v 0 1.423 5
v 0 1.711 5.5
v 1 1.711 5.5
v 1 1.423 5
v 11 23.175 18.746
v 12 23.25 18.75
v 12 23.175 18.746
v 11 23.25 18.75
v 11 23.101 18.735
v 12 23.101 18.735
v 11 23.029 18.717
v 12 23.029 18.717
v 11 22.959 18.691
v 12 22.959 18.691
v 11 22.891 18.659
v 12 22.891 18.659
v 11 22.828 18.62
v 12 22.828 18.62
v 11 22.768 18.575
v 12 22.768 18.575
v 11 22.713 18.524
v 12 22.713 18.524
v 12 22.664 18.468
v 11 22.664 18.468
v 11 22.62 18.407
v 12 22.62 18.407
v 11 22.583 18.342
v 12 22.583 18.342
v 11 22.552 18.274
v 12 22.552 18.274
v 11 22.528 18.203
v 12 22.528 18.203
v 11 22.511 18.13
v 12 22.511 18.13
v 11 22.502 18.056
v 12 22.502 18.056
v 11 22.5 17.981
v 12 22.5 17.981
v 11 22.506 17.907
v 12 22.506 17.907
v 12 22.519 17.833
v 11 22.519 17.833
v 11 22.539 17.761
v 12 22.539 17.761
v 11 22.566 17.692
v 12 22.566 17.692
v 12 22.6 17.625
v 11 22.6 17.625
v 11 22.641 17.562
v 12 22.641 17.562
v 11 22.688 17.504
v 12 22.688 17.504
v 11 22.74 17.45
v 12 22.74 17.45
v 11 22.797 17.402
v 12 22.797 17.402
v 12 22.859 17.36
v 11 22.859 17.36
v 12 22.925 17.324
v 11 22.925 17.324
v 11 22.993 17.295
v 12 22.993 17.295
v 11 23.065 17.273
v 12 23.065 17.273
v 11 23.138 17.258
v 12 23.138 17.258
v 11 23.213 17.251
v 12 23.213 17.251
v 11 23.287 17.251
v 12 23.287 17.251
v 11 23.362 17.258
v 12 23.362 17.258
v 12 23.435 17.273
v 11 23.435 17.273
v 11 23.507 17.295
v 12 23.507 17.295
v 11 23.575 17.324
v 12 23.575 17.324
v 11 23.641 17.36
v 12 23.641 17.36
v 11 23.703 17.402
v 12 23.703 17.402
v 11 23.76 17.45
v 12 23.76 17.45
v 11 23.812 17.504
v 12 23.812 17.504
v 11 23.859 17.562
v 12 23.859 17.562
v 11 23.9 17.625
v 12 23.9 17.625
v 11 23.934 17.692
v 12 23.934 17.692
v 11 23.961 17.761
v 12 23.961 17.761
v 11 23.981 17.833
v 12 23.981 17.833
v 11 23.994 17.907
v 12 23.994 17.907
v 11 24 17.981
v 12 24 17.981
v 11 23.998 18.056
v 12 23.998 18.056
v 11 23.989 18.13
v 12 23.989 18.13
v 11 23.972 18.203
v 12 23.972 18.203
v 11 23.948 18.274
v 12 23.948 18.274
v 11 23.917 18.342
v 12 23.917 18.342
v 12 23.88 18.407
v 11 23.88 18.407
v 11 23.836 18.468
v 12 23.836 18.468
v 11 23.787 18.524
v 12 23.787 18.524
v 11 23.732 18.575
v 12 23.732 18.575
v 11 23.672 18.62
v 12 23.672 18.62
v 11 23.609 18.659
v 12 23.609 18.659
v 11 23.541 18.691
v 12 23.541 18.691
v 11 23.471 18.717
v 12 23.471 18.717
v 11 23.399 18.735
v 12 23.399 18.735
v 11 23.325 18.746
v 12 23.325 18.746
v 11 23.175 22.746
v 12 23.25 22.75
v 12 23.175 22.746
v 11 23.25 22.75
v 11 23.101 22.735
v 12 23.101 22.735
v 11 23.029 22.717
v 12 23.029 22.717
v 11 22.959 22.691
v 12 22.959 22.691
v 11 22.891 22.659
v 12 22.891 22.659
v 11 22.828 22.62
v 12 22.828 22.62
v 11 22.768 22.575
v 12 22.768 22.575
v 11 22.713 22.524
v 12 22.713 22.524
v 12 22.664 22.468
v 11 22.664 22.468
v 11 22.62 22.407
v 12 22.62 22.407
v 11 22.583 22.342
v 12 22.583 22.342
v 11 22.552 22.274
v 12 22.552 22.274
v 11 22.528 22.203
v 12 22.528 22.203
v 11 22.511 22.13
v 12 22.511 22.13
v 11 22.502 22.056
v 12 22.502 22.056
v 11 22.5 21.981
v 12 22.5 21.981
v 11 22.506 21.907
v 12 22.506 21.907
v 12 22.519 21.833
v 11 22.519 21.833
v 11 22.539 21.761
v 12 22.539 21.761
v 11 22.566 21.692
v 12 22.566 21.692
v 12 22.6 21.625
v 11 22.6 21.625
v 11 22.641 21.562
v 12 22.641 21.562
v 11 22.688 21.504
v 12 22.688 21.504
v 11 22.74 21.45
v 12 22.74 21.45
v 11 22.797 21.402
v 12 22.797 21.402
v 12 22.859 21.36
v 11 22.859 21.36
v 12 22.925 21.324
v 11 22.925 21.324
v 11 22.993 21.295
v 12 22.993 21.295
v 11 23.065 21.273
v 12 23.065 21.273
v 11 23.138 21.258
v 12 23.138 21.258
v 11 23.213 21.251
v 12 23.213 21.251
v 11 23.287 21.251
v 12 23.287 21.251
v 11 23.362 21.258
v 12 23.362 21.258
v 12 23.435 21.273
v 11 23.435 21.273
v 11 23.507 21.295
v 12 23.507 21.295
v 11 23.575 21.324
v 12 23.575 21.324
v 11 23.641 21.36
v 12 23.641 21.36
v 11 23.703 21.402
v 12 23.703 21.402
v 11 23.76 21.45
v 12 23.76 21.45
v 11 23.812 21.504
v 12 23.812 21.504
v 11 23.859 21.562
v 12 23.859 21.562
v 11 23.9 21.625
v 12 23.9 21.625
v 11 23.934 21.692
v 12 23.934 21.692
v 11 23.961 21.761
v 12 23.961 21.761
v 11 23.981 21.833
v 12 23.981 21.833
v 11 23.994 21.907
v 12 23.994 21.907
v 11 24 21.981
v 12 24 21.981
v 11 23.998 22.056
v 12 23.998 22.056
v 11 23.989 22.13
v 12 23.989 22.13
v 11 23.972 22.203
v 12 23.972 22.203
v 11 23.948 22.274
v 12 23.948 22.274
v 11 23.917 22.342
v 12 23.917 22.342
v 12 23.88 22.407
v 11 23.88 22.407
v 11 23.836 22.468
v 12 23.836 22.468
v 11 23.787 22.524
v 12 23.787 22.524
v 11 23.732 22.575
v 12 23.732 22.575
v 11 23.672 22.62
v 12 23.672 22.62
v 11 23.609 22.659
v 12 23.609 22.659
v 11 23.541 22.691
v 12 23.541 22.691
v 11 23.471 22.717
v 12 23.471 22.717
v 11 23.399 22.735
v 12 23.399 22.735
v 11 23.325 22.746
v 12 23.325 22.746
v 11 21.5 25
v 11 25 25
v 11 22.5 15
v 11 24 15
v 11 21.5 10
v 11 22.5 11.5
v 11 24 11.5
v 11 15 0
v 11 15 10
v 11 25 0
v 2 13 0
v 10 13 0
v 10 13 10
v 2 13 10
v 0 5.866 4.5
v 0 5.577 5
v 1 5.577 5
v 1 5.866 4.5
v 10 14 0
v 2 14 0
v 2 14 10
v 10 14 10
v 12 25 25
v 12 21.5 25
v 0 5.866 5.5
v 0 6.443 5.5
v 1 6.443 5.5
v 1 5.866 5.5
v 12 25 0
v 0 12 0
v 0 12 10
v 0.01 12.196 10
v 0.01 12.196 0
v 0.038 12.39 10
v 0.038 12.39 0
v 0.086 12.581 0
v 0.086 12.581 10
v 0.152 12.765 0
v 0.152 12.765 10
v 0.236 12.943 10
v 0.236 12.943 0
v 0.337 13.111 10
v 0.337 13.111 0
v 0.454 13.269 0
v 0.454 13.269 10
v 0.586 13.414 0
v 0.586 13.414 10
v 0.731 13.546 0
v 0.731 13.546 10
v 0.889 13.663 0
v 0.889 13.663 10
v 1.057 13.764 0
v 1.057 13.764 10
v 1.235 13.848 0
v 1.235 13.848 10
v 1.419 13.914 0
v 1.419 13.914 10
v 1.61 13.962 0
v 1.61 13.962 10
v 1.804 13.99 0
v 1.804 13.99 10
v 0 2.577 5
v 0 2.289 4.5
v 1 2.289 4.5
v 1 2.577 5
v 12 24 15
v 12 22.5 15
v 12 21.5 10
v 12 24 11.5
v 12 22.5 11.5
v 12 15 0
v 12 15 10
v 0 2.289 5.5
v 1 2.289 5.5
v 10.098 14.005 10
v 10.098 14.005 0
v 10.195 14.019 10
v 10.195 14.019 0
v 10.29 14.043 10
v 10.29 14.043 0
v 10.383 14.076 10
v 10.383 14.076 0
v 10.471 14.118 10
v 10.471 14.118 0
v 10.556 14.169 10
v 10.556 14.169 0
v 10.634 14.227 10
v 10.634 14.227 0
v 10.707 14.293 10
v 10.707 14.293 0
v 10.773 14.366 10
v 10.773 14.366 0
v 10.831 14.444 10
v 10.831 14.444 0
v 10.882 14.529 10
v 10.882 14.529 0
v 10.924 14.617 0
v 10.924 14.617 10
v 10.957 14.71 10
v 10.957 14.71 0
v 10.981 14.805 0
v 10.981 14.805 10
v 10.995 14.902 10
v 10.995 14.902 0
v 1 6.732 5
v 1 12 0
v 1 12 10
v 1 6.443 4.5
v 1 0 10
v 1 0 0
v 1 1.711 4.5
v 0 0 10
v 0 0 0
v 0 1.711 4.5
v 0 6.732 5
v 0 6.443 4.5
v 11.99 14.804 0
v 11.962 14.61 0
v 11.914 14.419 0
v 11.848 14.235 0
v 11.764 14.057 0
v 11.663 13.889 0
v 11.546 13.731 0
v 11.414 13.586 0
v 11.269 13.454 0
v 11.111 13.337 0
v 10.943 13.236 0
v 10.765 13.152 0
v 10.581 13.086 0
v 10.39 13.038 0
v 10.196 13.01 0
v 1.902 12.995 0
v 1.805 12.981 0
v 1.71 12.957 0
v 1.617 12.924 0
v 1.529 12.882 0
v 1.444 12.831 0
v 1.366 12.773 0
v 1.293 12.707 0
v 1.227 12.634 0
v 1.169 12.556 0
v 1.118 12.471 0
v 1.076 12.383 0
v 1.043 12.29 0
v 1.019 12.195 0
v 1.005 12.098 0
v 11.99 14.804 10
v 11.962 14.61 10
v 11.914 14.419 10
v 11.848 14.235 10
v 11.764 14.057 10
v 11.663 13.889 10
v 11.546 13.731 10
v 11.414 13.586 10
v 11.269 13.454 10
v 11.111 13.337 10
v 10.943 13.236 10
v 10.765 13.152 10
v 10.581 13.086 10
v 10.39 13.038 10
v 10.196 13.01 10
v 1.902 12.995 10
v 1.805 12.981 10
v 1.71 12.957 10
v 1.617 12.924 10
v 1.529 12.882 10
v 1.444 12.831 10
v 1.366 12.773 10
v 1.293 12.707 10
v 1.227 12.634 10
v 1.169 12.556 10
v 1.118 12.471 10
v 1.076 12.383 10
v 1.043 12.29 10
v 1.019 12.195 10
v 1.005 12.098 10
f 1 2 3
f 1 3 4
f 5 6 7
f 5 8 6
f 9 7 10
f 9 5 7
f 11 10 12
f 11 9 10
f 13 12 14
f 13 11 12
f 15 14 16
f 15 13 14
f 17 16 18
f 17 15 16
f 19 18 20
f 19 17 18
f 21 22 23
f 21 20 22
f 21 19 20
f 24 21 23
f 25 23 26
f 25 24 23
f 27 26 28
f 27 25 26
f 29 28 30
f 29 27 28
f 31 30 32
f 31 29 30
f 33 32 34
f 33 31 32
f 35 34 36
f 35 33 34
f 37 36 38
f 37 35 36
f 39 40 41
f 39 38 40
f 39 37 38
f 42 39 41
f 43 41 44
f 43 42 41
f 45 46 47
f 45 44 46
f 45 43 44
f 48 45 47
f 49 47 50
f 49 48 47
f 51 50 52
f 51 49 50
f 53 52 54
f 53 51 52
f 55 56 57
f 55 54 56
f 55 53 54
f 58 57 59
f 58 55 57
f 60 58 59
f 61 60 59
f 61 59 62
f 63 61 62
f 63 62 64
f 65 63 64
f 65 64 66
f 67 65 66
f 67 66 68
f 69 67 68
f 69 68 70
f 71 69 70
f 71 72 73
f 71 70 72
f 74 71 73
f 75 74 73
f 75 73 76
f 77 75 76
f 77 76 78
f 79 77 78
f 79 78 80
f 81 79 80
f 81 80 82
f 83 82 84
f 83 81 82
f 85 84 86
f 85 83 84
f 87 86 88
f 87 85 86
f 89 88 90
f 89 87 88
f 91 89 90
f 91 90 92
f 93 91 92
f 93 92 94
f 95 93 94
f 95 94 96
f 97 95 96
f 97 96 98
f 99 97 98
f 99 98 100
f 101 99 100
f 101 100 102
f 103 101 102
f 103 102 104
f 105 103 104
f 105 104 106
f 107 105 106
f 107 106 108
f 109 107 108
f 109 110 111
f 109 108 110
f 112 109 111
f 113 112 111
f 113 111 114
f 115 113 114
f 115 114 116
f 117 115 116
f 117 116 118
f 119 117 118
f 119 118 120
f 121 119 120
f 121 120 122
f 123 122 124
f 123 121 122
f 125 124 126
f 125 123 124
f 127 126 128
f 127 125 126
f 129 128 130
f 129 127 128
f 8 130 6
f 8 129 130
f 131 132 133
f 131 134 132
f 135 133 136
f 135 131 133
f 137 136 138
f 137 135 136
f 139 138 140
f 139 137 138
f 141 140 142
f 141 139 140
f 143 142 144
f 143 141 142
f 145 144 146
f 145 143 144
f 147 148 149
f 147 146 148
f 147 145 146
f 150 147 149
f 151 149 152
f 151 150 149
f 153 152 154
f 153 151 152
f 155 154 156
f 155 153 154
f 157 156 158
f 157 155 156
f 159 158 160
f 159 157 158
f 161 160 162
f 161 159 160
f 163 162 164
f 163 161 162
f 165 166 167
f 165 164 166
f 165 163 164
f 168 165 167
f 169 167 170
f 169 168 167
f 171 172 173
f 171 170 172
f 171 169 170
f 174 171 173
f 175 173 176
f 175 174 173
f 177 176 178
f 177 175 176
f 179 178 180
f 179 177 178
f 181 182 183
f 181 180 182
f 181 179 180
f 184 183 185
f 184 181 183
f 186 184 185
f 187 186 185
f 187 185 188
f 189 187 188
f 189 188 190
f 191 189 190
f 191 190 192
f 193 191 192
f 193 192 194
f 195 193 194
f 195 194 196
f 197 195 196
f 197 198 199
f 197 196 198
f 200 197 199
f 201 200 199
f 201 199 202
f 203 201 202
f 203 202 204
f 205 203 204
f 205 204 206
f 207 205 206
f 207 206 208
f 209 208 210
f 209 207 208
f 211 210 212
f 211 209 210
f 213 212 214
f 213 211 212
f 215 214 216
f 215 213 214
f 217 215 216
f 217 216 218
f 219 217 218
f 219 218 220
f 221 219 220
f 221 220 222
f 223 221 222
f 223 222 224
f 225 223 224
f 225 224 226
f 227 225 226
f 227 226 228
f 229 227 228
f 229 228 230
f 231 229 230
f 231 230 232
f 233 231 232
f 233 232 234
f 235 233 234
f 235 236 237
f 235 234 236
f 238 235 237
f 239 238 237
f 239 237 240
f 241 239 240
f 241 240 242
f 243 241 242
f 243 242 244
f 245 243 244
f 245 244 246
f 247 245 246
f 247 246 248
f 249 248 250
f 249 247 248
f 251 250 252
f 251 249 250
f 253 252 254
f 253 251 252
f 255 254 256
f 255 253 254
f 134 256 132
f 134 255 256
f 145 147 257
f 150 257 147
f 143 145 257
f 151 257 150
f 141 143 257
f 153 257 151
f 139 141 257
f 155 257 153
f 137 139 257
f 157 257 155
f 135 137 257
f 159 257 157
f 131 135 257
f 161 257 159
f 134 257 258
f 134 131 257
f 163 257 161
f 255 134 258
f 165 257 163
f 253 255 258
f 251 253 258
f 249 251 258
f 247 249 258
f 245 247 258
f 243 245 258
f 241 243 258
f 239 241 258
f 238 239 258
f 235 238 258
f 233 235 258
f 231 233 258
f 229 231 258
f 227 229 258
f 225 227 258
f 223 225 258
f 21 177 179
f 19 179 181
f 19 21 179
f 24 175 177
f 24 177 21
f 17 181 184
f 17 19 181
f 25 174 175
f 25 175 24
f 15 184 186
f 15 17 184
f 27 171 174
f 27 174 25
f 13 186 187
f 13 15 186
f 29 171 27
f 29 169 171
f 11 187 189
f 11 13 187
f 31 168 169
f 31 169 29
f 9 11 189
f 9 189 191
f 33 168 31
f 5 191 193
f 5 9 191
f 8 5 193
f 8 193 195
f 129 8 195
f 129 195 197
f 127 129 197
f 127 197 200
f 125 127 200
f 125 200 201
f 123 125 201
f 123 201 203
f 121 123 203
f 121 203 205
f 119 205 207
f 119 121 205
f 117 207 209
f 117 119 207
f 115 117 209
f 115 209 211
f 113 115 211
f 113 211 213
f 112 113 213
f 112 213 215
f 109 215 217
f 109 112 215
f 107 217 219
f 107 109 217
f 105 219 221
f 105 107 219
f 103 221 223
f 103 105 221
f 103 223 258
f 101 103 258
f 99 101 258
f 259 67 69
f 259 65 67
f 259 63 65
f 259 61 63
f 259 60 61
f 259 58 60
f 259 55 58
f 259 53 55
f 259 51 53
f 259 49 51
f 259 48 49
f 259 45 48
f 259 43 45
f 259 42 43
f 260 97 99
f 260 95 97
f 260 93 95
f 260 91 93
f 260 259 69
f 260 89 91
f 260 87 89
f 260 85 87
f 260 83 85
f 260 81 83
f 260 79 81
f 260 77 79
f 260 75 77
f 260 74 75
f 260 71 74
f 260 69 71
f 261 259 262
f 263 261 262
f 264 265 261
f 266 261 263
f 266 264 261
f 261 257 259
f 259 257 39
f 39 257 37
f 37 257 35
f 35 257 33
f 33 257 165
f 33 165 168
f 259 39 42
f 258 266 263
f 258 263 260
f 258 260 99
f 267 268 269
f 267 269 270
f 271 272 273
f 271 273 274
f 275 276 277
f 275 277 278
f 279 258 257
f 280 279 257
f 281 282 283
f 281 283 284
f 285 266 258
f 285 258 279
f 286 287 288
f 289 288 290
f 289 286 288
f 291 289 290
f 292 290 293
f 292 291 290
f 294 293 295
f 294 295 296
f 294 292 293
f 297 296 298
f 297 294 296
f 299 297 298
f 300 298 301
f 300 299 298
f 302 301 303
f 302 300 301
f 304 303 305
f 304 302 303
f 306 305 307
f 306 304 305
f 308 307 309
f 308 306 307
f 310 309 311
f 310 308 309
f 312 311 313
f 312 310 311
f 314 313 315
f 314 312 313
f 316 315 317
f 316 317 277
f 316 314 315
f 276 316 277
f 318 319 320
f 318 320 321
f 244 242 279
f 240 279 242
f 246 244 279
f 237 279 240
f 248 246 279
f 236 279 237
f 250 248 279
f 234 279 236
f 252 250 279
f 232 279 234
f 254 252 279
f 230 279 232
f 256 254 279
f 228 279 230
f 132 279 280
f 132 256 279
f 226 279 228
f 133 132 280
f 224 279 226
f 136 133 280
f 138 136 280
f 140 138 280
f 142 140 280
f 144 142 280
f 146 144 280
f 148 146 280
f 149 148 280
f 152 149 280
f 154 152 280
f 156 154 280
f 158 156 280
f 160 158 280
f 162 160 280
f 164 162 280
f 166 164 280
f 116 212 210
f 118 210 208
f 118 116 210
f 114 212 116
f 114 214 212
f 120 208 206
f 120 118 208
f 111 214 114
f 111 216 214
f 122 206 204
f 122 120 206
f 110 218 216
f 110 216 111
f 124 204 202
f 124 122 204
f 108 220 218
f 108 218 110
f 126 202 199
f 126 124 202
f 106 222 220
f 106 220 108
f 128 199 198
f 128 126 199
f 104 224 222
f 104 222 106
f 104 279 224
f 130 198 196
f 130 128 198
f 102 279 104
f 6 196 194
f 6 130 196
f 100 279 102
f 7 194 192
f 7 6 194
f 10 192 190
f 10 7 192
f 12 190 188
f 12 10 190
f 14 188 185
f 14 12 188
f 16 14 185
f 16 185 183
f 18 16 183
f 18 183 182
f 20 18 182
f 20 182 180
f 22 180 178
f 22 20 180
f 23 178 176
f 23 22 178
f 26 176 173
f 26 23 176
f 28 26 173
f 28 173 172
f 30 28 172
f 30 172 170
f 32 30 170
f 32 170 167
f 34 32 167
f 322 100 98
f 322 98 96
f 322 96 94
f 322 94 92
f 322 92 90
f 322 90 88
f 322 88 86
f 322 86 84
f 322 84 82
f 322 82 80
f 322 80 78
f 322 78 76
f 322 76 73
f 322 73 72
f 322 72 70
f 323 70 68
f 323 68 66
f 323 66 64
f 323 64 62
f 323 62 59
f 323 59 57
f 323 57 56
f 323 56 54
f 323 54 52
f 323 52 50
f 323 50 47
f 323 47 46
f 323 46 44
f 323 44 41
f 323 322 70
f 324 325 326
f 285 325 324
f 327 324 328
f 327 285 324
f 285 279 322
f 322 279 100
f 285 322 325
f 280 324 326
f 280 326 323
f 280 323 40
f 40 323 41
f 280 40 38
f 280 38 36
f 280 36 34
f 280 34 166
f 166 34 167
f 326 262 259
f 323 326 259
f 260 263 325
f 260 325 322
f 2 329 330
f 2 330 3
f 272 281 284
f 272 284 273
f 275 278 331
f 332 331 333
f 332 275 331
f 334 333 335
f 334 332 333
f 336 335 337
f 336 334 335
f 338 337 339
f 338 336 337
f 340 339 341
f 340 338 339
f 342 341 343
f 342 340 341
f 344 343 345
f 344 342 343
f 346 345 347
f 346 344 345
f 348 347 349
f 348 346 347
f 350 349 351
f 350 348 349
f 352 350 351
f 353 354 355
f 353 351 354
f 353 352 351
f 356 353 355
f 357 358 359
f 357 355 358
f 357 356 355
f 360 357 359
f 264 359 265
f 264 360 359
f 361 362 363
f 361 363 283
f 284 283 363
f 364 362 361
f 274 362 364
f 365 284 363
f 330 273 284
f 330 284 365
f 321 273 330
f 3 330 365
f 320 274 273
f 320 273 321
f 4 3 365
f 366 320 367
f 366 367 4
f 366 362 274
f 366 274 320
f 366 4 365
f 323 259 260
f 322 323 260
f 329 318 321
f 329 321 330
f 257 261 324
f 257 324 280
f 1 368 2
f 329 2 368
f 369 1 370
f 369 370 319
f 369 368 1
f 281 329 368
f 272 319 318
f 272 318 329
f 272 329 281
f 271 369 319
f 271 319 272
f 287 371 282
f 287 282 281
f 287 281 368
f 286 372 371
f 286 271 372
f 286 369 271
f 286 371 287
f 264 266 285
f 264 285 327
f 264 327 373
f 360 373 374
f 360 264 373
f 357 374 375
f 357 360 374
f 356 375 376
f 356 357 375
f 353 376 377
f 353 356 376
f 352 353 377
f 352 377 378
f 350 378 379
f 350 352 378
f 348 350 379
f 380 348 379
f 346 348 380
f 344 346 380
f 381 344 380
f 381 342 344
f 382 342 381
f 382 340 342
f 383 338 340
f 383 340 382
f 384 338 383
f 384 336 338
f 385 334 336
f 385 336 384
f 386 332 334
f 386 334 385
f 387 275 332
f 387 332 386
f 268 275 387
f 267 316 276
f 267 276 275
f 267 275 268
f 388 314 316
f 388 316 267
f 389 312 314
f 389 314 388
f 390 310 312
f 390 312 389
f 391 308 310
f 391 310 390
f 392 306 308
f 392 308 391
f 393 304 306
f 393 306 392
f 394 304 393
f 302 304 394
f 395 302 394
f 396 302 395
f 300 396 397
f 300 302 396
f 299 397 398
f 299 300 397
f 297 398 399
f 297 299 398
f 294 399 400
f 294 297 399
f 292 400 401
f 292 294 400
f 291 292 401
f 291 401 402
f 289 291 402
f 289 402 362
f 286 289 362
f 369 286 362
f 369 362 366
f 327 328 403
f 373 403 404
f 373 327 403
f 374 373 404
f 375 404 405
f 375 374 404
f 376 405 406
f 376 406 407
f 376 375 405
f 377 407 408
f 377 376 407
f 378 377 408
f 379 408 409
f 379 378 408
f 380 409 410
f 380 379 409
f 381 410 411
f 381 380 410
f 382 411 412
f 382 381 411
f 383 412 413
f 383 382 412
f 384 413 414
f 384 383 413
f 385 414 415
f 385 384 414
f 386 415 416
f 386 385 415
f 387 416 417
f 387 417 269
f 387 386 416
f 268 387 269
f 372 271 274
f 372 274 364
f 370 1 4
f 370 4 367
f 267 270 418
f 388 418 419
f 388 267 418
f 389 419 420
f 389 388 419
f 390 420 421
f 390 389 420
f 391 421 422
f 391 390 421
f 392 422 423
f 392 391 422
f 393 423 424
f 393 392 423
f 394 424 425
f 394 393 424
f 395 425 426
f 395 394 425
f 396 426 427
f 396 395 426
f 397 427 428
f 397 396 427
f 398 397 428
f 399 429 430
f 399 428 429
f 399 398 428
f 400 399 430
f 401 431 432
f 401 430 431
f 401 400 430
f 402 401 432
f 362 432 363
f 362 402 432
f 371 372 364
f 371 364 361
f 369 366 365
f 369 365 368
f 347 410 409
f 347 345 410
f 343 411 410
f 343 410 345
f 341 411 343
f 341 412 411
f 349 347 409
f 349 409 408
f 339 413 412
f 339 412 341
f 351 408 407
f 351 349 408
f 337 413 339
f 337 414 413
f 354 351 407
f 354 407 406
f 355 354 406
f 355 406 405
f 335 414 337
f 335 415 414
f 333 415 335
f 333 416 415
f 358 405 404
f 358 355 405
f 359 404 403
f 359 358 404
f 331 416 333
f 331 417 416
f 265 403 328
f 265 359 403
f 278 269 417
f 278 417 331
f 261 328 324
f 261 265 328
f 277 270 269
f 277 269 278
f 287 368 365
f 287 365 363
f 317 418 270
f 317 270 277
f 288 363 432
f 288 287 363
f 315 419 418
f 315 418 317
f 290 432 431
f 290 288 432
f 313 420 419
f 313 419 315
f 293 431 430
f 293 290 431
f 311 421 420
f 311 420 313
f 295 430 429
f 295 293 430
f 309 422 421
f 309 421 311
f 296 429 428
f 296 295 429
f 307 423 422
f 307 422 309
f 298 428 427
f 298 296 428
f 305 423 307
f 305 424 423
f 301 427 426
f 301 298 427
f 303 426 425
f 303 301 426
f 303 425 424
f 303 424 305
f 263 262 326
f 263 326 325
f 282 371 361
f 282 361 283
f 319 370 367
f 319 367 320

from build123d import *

# Parameters (mm, degrees)
BASE_FLANGE1_DEPTH      = 25
CUT_EXTRUDE1_DEPTH      = 38.336309405
CUT_EXTRUDE1_DEPTH_BACK = 38.336309405
SKETCH6_W               = 21.5
SKETCH6_H               = 15
CUT_EXTRUDE2_DEPTH      = 38.336309405
CUT_EXTRUDE2_DEPTH_BACK = 38.336309405
SKETCH7_R               = 0.75
SKETCH7_W               = 1.5
SKETCH7_H               = 3.5
CUT_EXTRUDE3_DEPTH      = 38.027017163
CUT_EXTRUDE3_DEPTH_BACK = 38.027017163


# Sheet-metal steps are written as plain solids
with BuildPart() as part:
    # Sketch1 → Base-Flange1 (new body)
    with BuildSketch(Plane(origin=(0, 0, 0), x_dir=(0, 1, 0), z_dir=(0, 0, 1))):
        with BuildLine():
            Line((0, 0), (12, 0))
            ThreePointArc((12, 0), (13.414213562, -0.585786438), (14, -2))
            Line((14, -2), (14, -10))
            ThreePointArc((14, -10), (14.292893219, -10.707106781), (15, -11))
            Line((15, -11), (25, -11))
            Line((25, -11), (25, -12))
            Line((25, -12), (15, -12))
            ThreePointArc((15, -12), (13.585786438, -11.414213562), (13, -10))
            Line((13, -10), (13, -2))
            ThreePointArc((13, -2), (12.707106781, -1.292893219), (12, -1))
            Line((12, -1), (0, -1))
            Line((0, -1), (0, 0))
        make_face()
    extrude(amount=BASE_FLANGE1_DEPTH)

    # Sketch6 → Cut-Extrude1 (cut, two sides: drawn at the far end of the back side and taken through both)
    with BuildSketch(Plane.YZ.offset(-CUT_EXTRUDE1_DEPTH_BACK)):
        with Locations((10.75, 17.5)):
            Rectangle(SKETCH6_W, SKETCH6_H)
    extrude(amount=CUT_EXTRUDE1_DEPTH + CUT_EXTRUDE1_DEPTH_BACK, mode=Mode.SUBTRACT)

    # Sketch7 → Cut-Extrude2 (cut, two sides: drawn at the far end of the back side and taken through both)
    with BuildSketch(Plane.YZ.offset(12).offset(-CUT_EXTRUDE2_DEPTH_BACK)):
        with Locations(Location((23.25, 22, 0), (0, 0, 90))):
            Circle(SKETCH7_R)
        with Locations(Location((23.25, 18, 0), (0, 0, 90))):
            Circle(SKETCH7_R)
        with Locations((23.25, 13.25)):
            Rectangle(SKETCH7_W, SKETCH7_H)
    extrude(amount=CUT_EXTRUDE2_DEPTH + CUT_EXTRUDE2_DEPTH_BACK, mode=Mode.SUBTRACT)

    # Sketch8 → Cut-Extrude3 (cut, two sides: drawn at the far end of the back side and taken through both)
    with BuildSketch(Plane.YZ.offset(1).offset(-CUT_EXTRUDE3_DEPTH_BACK)):
        Polygon((2.577350269, 5), (2.288675135, 5.5), (1.711324865, 5.5), (1.422649731, 5), (1.711324865, 4.5), (2.288675135, 4.5), align=None)
        Polygon((6.732050808, 5), (6.443375673, 5.5), (5.866025404, 5.5), (5.577350269, 5), (5.866025404, 4.5), (6.443375673, 4.5), align=None)
    extrude(amount=CUT_EXTRUDE3_DEPTH + CUT_EXTRUDE3_DEPTH_BACK, mode=Mode.SUBTRACT)


solid = part.part
